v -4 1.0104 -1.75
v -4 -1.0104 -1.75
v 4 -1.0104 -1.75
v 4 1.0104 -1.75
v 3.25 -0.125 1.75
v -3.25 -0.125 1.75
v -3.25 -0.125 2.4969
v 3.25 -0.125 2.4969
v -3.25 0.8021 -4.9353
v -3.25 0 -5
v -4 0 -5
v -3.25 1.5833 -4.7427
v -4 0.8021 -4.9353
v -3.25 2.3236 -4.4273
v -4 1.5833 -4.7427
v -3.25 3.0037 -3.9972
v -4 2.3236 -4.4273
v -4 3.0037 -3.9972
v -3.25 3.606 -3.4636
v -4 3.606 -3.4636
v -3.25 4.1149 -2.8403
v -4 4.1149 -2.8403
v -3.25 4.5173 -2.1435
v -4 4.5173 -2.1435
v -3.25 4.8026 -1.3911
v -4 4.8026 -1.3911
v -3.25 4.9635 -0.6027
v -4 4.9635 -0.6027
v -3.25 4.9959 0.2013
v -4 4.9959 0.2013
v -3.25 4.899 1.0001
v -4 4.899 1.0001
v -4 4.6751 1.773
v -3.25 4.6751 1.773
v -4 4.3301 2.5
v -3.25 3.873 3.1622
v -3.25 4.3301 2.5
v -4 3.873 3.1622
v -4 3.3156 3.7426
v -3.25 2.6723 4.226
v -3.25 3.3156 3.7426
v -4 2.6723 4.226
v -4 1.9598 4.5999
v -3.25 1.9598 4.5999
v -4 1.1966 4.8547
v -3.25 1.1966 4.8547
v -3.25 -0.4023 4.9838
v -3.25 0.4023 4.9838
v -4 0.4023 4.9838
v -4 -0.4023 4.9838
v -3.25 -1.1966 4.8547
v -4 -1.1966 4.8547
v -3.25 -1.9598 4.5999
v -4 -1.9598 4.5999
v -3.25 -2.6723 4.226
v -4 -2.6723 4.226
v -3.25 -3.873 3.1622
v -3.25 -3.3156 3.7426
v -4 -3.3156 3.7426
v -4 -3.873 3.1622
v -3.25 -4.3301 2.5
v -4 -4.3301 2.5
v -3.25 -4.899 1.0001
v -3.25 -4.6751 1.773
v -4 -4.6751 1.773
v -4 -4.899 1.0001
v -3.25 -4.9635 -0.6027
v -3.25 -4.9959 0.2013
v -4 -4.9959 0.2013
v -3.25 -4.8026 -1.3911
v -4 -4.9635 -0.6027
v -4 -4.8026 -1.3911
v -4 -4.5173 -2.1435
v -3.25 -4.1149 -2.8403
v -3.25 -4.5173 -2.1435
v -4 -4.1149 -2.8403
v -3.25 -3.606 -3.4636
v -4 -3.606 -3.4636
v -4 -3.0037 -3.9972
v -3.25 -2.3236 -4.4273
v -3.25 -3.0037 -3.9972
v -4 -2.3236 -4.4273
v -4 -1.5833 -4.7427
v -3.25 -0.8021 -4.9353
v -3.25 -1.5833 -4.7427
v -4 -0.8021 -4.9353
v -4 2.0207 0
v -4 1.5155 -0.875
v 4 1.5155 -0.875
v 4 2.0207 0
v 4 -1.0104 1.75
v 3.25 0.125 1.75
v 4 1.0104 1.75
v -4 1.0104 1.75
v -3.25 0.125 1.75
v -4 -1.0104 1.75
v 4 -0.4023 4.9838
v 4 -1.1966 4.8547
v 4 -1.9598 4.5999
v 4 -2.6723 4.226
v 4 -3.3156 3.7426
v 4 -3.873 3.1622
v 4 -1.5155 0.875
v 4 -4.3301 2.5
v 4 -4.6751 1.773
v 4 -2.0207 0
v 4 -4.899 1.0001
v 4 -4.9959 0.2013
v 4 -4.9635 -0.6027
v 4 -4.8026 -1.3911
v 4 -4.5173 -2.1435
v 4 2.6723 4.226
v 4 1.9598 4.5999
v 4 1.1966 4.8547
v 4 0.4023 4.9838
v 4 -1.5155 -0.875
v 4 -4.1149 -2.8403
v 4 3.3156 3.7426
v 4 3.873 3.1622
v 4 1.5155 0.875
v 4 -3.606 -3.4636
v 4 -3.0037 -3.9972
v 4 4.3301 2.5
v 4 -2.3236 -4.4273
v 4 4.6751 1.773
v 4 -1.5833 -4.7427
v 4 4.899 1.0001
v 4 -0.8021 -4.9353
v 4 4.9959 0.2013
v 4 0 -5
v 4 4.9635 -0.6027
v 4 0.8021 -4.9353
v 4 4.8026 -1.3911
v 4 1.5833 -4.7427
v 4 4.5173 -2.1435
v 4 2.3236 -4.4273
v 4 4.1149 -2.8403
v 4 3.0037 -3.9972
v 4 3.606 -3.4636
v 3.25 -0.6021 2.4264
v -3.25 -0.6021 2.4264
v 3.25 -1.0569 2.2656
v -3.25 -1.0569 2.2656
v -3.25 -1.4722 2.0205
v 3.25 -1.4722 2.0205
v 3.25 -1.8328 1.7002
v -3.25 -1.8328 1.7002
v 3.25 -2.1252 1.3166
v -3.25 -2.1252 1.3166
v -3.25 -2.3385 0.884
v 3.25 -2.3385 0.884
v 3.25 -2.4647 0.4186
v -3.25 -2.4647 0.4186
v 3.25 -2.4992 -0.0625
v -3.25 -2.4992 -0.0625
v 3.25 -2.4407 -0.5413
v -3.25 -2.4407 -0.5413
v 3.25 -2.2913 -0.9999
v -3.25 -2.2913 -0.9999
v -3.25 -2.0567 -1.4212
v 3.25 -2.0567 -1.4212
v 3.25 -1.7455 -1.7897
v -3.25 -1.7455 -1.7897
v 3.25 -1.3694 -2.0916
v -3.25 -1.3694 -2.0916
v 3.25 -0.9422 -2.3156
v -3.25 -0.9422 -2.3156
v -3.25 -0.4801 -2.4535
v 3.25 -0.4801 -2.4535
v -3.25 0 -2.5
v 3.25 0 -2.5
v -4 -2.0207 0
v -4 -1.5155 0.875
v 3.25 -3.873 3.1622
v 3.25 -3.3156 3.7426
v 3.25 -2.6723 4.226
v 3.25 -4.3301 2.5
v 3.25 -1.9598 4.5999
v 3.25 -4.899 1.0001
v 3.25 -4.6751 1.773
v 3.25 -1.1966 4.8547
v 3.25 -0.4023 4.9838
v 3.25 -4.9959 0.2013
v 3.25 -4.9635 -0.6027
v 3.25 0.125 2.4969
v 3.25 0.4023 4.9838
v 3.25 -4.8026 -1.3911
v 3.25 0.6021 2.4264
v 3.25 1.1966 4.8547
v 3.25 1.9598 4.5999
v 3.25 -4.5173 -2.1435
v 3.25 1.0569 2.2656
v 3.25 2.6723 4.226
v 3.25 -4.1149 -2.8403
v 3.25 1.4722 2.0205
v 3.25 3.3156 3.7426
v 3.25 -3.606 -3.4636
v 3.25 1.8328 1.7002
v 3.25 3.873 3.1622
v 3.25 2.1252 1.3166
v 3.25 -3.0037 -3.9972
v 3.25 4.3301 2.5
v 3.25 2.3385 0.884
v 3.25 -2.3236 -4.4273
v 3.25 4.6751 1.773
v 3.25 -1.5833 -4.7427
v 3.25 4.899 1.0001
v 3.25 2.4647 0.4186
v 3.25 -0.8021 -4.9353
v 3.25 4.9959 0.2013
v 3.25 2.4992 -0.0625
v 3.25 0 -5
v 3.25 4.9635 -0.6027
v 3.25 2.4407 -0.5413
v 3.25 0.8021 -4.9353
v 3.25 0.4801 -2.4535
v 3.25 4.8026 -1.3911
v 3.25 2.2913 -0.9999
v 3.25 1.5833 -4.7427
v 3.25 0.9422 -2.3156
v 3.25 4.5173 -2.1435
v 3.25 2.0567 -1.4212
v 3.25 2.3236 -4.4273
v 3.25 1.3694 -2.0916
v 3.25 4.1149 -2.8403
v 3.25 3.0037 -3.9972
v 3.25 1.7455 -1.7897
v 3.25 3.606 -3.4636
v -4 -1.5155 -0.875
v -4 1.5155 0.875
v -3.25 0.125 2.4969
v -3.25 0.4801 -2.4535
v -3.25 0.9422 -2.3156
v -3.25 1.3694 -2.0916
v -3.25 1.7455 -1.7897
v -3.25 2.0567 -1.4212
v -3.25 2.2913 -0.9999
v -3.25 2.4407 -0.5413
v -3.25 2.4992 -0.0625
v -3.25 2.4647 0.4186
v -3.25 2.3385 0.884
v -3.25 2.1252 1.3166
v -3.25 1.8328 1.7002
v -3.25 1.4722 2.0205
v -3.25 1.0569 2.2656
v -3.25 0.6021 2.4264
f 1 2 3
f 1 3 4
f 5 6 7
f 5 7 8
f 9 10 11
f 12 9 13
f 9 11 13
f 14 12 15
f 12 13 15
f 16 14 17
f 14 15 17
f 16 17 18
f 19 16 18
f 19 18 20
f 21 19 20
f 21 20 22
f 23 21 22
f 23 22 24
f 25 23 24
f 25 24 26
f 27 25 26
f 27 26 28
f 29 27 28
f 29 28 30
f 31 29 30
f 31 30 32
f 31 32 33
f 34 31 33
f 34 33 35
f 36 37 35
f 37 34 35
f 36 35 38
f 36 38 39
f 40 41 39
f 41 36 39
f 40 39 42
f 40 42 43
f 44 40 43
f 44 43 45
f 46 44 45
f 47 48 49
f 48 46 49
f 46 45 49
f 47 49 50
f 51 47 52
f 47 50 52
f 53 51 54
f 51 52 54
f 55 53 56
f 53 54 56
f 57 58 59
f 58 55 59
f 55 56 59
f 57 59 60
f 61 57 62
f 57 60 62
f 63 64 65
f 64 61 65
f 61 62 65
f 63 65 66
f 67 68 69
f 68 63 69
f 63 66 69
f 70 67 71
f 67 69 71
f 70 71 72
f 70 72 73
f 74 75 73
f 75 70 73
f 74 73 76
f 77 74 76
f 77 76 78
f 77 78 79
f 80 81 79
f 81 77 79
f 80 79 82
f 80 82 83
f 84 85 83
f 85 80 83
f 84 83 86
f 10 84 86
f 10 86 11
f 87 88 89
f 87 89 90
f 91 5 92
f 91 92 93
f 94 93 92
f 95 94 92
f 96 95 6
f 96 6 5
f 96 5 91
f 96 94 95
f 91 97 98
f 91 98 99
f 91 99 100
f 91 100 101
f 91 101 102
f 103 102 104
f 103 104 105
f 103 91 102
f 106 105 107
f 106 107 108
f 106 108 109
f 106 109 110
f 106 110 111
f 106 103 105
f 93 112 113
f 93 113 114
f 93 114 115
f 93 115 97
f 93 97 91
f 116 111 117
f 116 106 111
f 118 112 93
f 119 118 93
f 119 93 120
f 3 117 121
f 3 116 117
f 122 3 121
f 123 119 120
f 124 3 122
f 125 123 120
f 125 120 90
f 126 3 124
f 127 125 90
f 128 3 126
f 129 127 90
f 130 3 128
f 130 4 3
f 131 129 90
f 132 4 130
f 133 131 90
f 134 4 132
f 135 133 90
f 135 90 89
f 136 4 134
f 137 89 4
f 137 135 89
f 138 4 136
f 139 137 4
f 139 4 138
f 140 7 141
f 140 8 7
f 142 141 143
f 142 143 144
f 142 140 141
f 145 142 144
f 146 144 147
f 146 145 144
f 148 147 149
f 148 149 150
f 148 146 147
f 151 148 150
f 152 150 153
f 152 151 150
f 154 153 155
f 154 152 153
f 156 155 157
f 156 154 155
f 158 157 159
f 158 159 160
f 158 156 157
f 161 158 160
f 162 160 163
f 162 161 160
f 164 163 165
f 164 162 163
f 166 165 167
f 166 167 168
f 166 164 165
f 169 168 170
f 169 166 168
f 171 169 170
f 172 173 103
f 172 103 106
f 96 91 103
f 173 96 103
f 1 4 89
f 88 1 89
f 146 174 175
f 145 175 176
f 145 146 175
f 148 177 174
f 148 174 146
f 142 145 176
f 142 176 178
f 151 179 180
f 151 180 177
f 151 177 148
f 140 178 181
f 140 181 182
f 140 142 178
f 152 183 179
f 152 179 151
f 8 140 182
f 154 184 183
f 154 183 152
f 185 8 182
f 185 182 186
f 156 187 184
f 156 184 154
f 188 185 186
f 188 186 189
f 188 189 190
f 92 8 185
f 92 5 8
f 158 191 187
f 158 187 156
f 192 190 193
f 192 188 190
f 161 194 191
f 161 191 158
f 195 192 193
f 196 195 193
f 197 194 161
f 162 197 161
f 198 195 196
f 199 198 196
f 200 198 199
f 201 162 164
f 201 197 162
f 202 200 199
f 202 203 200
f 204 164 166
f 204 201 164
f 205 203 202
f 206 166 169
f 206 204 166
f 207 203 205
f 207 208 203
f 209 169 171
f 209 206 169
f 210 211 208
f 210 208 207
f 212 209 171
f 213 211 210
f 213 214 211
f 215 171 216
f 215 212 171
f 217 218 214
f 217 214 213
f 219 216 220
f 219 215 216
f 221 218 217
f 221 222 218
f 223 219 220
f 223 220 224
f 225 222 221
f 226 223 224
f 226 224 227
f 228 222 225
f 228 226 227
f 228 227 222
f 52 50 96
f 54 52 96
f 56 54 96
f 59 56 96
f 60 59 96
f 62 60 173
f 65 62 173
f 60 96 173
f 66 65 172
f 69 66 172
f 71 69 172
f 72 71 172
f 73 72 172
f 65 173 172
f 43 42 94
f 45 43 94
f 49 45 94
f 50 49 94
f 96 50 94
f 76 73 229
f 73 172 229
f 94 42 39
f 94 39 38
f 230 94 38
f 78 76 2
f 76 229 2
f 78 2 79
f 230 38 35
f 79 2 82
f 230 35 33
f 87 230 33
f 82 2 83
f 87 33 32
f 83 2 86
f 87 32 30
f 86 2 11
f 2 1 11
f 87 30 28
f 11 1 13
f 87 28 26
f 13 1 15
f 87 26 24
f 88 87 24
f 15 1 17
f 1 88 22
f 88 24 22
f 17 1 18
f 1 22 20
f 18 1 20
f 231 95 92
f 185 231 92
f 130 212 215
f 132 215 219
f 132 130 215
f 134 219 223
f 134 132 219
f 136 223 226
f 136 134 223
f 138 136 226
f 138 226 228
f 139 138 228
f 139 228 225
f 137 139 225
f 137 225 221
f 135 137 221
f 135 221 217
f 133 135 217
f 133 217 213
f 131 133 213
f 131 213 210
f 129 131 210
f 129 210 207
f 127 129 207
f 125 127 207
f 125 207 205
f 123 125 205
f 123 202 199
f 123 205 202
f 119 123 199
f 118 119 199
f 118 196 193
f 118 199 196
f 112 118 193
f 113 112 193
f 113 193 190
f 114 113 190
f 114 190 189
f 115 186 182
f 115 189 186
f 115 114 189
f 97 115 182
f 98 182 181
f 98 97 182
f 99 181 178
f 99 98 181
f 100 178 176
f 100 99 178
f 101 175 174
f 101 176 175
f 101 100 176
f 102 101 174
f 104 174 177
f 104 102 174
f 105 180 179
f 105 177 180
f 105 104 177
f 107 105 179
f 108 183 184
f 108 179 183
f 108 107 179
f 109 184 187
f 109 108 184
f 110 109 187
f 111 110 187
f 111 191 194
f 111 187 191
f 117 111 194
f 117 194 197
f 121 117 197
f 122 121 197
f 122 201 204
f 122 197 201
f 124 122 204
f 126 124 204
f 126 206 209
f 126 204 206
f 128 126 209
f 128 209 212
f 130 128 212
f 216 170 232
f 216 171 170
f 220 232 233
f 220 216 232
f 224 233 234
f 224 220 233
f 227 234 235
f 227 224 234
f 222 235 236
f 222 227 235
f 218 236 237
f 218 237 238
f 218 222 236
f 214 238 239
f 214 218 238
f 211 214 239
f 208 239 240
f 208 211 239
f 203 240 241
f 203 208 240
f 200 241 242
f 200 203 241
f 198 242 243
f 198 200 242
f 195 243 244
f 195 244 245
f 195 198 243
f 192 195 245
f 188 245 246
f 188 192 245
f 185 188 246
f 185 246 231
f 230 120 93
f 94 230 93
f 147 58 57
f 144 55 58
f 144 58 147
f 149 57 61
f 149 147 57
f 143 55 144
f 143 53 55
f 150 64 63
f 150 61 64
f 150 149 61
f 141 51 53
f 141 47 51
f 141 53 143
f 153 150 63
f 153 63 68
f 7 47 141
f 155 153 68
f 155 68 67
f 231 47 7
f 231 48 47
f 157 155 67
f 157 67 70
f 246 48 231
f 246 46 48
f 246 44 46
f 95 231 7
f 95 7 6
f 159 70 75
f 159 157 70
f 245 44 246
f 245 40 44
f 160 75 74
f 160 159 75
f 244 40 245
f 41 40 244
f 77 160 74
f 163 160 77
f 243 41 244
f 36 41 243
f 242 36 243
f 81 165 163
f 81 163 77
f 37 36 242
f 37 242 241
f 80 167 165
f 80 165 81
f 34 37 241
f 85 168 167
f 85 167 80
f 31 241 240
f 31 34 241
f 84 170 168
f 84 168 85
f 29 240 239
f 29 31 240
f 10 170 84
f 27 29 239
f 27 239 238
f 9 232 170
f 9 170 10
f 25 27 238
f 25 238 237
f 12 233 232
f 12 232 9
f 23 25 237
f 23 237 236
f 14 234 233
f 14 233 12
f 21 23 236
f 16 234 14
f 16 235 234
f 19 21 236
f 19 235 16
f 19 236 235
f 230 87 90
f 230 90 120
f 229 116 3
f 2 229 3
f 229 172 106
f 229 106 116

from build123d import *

# Parameters (mm, degrees)
SKETCH1_R           = 2.5
BOSS_EXTRUDE1_DEPTH = 4
SKETCH2_R           = 5
BOSS_EXTRUDE2_DEPTH = 0.75
M1_6_NUT_DEPTH      = 9.124038405
M1_6_NUT_DEPTH_BACK = 9.124038405
SKETCH5_W           = 6.5
SKETCH5_H           = 0.25
CUT_EXTRUDE1_DEPTH  = 9.124038405


with BuildPart() as part:
    # Sketch1 → Boss-Extrude1 (new, symmetric)
    with BuildSketch(Plane(origin=(0, 0, 0), x_dir=(0, 0, -1), z_dir=(1, 0, 0))):
        Circle(SKETCH1_R)
    extrude(amount=BOSS_EXTRUDE1_DEPTH, both=True)

    # Sketch2 → Boss-Extrude2 (add)
    with BuildSketch(Plane(origin=(4, 0, 0), x_dir=(0, 0, -1), z_dir=(1, 0, 0))):
        Circle(SKETCH2_R)
    boss_extrude2 = extrude(amount=-BOSS_EXTRUDE2_DEPTH)

    # Mirror1: Boss-Extrude2 across plane
    add(boss_extrude2.mirror(Plane(origin=(0, 0, 0), x_dir=(0, 0, 1), z_dir=(1, 0, 0))))

    # Sketch3 → M1.6 Nut (cut, two sides: drawn at the far end of the back side and taken through both)
    with BuildSketch(Plane(origin=(0, 0, 0), x_dir=(0, 0, -1), z_dir=(1, 0, 0)).offset(-M1_6_NUT_DEPTH_BACK)):
        Polygon((1.75, 0), (1.75, 1.010362971), (0.875, 1.515544457), (0, 2.020725942), (-0.875, 1.515544457), (-1.75, 1.010362971), (-1.75, 0), (-1.75, -1.010362971), (-0.875, -1.515544457), (0, -2.020725942), (0.875, -1.515544457), (1.75, -1.010362971), align=None)
    extrude(amount=M1_6_NUT_DEPTH + M1_6_NUT_DEPTH_BACK, mode=Mode.SUBTRACT)

    # Sketch5 → Cut-Extrude1 (cut, through all)
    with BuildSketch(Plane.XY):
        Rectangle(SKETCH5_W, SKETCH5_H)
    extrude(amount=CUT_EXTRUDE1_DEPTH, mode=Mode.SUBTRACT)


solid = part.part
